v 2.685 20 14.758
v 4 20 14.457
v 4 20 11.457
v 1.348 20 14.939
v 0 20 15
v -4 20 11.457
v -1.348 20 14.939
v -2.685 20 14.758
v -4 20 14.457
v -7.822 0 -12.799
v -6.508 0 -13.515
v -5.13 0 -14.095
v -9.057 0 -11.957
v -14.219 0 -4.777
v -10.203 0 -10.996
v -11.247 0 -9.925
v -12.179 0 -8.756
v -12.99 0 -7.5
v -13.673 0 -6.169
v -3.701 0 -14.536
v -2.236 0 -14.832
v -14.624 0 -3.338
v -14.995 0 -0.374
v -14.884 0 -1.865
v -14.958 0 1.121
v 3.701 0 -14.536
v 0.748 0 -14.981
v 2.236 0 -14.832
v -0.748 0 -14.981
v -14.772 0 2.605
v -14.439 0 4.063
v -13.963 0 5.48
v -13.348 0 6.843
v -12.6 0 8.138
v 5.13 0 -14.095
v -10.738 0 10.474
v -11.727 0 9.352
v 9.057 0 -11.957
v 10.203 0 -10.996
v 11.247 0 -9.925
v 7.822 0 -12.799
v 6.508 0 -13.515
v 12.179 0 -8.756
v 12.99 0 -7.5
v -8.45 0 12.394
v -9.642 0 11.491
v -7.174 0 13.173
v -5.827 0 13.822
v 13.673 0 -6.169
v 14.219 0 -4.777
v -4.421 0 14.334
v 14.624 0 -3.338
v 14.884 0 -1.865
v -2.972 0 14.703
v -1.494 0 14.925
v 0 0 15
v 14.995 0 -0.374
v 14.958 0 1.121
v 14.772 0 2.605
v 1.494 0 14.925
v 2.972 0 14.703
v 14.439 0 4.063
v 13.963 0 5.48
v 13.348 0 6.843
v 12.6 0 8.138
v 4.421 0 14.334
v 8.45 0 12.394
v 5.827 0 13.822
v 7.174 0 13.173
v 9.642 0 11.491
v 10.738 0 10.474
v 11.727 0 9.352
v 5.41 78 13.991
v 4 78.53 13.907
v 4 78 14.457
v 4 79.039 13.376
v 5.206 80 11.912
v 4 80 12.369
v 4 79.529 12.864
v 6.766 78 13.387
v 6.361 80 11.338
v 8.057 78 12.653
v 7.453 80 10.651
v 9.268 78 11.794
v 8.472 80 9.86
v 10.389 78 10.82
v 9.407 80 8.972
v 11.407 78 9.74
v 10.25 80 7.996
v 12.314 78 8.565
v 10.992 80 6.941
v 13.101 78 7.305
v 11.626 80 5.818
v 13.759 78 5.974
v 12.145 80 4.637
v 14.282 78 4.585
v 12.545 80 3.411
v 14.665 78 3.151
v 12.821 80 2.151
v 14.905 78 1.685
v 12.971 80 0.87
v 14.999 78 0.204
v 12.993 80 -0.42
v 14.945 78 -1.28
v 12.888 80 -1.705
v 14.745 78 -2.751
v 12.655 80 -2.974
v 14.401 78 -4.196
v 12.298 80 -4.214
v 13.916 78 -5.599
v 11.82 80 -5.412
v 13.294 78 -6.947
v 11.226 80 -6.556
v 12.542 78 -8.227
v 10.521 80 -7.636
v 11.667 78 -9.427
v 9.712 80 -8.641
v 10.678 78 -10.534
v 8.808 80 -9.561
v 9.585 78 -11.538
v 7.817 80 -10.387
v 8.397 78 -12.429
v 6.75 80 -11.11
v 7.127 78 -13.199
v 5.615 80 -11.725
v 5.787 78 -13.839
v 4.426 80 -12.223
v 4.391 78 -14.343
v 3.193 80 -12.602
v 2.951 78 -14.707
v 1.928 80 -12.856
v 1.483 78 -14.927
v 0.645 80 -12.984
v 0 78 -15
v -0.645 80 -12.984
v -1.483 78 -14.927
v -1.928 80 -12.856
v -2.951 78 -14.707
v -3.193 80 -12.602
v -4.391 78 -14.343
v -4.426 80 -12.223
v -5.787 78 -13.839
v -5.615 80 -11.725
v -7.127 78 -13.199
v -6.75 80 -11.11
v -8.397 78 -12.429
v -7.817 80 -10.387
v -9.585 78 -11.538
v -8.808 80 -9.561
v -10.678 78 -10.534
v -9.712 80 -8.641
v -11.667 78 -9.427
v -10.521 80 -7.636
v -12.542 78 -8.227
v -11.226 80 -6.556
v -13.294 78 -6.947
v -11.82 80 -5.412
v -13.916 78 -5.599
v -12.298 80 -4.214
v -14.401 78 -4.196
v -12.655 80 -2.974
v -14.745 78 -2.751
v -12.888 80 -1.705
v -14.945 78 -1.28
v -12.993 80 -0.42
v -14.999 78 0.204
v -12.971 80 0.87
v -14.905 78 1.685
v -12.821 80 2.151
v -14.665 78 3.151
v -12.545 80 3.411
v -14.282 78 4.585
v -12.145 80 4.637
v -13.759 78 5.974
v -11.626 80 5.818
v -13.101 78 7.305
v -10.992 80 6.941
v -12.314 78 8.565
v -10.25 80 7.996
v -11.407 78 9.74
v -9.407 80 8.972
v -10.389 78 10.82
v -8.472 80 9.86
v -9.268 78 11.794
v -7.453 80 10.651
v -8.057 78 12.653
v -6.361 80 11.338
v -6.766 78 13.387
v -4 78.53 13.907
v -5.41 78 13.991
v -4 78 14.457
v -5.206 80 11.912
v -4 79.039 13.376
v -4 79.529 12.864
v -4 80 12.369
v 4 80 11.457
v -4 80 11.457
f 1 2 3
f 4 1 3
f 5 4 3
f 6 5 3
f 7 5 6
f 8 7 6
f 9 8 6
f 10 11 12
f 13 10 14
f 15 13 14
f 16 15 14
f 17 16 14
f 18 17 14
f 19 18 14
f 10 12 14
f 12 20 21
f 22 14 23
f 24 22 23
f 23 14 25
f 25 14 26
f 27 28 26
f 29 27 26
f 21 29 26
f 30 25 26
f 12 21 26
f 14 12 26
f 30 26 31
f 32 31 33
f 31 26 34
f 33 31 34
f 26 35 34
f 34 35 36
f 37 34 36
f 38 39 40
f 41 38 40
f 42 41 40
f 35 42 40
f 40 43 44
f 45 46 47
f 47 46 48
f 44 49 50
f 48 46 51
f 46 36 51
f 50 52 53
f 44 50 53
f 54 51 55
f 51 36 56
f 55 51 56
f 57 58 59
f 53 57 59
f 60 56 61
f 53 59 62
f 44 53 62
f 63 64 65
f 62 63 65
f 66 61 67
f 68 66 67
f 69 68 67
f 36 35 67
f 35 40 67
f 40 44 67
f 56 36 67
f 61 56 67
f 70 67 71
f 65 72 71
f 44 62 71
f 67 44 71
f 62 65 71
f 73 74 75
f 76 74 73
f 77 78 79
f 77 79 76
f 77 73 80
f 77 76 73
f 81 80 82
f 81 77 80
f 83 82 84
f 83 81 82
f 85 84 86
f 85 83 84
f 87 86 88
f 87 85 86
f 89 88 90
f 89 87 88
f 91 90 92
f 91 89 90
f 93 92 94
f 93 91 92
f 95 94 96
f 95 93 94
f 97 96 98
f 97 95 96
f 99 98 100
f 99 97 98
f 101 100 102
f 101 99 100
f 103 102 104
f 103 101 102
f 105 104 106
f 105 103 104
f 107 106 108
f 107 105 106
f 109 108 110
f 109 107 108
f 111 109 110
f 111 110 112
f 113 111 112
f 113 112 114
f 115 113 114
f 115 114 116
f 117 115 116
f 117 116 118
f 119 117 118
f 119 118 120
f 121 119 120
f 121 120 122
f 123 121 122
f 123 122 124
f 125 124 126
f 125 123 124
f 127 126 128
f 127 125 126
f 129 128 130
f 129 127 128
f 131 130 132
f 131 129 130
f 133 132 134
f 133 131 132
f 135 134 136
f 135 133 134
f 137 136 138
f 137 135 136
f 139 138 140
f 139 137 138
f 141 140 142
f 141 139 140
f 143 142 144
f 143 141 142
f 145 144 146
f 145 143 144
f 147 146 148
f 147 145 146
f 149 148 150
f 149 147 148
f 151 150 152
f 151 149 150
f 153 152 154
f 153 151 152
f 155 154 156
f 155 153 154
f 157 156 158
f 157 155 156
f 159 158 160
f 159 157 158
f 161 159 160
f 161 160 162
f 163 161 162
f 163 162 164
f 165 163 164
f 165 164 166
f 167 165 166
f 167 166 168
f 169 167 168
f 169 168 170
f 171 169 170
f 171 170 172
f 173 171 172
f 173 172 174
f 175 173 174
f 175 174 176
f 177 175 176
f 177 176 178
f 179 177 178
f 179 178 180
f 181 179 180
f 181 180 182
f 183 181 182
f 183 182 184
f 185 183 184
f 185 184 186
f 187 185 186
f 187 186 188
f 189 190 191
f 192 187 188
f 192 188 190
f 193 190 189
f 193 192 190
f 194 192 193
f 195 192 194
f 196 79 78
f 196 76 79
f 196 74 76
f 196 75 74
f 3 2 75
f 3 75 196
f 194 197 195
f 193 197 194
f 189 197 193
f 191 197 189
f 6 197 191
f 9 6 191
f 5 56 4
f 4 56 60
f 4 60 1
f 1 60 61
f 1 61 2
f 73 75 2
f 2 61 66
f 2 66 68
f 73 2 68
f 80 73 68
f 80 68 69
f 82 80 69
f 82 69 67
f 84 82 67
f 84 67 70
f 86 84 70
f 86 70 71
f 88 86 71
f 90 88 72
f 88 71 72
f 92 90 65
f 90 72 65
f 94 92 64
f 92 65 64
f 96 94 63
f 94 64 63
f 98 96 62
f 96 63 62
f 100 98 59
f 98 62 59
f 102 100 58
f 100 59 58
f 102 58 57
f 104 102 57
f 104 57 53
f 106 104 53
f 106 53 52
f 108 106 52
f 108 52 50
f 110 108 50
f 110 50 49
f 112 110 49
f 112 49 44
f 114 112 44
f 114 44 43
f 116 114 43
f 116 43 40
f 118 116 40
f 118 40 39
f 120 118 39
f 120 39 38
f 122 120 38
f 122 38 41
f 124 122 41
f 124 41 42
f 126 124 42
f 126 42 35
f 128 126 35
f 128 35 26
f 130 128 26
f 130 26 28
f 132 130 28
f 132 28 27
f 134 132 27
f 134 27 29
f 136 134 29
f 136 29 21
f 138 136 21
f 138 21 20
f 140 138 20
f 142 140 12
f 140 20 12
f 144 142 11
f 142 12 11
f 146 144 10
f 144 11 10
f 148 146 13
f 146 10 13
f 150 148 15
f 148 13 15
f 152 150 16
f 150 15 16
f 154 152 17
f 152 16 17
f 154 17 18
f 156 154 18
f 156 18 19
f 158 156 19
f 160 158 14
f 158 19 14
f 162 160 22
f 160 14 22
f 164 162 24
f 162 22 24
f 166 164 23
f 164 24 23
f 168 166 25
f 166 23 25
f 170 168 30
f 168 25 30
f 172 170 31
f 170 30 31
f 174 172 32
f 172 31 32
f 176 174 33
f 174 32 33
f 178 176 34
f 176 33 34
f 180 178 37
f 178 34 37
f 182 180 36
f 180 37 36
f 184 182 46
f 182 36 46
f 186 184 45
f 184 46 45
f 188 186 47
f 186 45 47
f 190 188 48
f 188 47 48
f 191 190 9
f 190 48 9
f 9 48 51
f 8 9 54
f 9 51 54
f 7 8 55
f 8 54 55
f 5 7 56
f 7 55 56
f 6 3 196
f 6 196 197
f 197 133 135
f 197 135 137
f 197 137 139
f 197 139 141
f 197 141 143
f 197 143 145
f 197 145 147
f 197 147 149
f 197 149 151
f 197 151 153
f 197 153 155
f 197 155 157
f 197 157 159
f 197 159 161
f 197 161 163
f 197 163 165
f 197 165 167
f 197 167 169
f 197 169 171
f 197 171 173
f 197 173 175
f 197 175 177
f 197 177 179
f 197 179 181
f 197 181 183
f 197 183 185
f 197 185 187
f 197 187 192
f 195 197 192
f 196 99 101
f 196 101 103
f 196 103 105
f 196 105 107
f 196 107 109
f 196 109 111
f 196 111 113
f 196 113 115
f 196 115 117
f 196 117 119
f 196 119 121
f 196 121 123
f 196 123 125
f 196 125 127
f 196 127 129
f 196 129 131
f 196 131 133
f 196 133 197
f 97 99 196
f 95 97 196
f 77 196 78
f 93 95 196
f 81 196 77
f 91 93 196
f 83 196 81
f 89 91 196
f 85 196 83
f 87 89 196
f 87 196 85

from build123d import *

# Parameters (mm, degrees)
SKETCH1_R           = 15
BOSS_EXTRUDE1_DEPTH = 80
CHAMFER1_SIZE       = 2
CUT_EXTRUDE1_START  = -60
CUT_EXTRUDE1_DEPTH  = 60


with BuildPart() as part:
    # Sketch1 → Boss-Extrude1 (new body)
    with BuildSketch(Plane(origin=(0, 0, 0), x_dir=(-1, 0, 0), z_dir=(0, 1, 0))):
        with Locations(Location((0, 0, 0), (0, 0, 90))):
            Circle(SKETCH1_R)
    extrude(amount=BOSS_EXTRUDE1_DEPTH)

    # Chamfer1
    chamfer1_edges = [part.edges().sort_by_distance(p)[0] for p in [
        (0, 80, -15),
    ]]
    chamfer(chamfer1_edges, length=CHAMFER1_SIZE)

    # Sketch3 → Cut-Extrude1 (cut)
    with BuildSketch(Plane(origin=(0, 80, 0), x_dir=(-1, 0, 0), z_dir=(0, 1, 0)).offset(CUT_EXTRUDE1_START)):
        with BuildLine():
            Line((-4, 14.456832295), (-4, 11.456832295))
            Line((-4, 11.456832295), (4, 11.456832295))
            Line((4, 11.456832295), (4, 14.456832295))
            ThreePointArc((4, 14.456832295), (0, 15), (-4, 14.456832295))
        make_face()
    extrude(amount=CUT_EXTRUDE1_DEPTH, mode=Mode.SUBTRACT)


solid = part.part
